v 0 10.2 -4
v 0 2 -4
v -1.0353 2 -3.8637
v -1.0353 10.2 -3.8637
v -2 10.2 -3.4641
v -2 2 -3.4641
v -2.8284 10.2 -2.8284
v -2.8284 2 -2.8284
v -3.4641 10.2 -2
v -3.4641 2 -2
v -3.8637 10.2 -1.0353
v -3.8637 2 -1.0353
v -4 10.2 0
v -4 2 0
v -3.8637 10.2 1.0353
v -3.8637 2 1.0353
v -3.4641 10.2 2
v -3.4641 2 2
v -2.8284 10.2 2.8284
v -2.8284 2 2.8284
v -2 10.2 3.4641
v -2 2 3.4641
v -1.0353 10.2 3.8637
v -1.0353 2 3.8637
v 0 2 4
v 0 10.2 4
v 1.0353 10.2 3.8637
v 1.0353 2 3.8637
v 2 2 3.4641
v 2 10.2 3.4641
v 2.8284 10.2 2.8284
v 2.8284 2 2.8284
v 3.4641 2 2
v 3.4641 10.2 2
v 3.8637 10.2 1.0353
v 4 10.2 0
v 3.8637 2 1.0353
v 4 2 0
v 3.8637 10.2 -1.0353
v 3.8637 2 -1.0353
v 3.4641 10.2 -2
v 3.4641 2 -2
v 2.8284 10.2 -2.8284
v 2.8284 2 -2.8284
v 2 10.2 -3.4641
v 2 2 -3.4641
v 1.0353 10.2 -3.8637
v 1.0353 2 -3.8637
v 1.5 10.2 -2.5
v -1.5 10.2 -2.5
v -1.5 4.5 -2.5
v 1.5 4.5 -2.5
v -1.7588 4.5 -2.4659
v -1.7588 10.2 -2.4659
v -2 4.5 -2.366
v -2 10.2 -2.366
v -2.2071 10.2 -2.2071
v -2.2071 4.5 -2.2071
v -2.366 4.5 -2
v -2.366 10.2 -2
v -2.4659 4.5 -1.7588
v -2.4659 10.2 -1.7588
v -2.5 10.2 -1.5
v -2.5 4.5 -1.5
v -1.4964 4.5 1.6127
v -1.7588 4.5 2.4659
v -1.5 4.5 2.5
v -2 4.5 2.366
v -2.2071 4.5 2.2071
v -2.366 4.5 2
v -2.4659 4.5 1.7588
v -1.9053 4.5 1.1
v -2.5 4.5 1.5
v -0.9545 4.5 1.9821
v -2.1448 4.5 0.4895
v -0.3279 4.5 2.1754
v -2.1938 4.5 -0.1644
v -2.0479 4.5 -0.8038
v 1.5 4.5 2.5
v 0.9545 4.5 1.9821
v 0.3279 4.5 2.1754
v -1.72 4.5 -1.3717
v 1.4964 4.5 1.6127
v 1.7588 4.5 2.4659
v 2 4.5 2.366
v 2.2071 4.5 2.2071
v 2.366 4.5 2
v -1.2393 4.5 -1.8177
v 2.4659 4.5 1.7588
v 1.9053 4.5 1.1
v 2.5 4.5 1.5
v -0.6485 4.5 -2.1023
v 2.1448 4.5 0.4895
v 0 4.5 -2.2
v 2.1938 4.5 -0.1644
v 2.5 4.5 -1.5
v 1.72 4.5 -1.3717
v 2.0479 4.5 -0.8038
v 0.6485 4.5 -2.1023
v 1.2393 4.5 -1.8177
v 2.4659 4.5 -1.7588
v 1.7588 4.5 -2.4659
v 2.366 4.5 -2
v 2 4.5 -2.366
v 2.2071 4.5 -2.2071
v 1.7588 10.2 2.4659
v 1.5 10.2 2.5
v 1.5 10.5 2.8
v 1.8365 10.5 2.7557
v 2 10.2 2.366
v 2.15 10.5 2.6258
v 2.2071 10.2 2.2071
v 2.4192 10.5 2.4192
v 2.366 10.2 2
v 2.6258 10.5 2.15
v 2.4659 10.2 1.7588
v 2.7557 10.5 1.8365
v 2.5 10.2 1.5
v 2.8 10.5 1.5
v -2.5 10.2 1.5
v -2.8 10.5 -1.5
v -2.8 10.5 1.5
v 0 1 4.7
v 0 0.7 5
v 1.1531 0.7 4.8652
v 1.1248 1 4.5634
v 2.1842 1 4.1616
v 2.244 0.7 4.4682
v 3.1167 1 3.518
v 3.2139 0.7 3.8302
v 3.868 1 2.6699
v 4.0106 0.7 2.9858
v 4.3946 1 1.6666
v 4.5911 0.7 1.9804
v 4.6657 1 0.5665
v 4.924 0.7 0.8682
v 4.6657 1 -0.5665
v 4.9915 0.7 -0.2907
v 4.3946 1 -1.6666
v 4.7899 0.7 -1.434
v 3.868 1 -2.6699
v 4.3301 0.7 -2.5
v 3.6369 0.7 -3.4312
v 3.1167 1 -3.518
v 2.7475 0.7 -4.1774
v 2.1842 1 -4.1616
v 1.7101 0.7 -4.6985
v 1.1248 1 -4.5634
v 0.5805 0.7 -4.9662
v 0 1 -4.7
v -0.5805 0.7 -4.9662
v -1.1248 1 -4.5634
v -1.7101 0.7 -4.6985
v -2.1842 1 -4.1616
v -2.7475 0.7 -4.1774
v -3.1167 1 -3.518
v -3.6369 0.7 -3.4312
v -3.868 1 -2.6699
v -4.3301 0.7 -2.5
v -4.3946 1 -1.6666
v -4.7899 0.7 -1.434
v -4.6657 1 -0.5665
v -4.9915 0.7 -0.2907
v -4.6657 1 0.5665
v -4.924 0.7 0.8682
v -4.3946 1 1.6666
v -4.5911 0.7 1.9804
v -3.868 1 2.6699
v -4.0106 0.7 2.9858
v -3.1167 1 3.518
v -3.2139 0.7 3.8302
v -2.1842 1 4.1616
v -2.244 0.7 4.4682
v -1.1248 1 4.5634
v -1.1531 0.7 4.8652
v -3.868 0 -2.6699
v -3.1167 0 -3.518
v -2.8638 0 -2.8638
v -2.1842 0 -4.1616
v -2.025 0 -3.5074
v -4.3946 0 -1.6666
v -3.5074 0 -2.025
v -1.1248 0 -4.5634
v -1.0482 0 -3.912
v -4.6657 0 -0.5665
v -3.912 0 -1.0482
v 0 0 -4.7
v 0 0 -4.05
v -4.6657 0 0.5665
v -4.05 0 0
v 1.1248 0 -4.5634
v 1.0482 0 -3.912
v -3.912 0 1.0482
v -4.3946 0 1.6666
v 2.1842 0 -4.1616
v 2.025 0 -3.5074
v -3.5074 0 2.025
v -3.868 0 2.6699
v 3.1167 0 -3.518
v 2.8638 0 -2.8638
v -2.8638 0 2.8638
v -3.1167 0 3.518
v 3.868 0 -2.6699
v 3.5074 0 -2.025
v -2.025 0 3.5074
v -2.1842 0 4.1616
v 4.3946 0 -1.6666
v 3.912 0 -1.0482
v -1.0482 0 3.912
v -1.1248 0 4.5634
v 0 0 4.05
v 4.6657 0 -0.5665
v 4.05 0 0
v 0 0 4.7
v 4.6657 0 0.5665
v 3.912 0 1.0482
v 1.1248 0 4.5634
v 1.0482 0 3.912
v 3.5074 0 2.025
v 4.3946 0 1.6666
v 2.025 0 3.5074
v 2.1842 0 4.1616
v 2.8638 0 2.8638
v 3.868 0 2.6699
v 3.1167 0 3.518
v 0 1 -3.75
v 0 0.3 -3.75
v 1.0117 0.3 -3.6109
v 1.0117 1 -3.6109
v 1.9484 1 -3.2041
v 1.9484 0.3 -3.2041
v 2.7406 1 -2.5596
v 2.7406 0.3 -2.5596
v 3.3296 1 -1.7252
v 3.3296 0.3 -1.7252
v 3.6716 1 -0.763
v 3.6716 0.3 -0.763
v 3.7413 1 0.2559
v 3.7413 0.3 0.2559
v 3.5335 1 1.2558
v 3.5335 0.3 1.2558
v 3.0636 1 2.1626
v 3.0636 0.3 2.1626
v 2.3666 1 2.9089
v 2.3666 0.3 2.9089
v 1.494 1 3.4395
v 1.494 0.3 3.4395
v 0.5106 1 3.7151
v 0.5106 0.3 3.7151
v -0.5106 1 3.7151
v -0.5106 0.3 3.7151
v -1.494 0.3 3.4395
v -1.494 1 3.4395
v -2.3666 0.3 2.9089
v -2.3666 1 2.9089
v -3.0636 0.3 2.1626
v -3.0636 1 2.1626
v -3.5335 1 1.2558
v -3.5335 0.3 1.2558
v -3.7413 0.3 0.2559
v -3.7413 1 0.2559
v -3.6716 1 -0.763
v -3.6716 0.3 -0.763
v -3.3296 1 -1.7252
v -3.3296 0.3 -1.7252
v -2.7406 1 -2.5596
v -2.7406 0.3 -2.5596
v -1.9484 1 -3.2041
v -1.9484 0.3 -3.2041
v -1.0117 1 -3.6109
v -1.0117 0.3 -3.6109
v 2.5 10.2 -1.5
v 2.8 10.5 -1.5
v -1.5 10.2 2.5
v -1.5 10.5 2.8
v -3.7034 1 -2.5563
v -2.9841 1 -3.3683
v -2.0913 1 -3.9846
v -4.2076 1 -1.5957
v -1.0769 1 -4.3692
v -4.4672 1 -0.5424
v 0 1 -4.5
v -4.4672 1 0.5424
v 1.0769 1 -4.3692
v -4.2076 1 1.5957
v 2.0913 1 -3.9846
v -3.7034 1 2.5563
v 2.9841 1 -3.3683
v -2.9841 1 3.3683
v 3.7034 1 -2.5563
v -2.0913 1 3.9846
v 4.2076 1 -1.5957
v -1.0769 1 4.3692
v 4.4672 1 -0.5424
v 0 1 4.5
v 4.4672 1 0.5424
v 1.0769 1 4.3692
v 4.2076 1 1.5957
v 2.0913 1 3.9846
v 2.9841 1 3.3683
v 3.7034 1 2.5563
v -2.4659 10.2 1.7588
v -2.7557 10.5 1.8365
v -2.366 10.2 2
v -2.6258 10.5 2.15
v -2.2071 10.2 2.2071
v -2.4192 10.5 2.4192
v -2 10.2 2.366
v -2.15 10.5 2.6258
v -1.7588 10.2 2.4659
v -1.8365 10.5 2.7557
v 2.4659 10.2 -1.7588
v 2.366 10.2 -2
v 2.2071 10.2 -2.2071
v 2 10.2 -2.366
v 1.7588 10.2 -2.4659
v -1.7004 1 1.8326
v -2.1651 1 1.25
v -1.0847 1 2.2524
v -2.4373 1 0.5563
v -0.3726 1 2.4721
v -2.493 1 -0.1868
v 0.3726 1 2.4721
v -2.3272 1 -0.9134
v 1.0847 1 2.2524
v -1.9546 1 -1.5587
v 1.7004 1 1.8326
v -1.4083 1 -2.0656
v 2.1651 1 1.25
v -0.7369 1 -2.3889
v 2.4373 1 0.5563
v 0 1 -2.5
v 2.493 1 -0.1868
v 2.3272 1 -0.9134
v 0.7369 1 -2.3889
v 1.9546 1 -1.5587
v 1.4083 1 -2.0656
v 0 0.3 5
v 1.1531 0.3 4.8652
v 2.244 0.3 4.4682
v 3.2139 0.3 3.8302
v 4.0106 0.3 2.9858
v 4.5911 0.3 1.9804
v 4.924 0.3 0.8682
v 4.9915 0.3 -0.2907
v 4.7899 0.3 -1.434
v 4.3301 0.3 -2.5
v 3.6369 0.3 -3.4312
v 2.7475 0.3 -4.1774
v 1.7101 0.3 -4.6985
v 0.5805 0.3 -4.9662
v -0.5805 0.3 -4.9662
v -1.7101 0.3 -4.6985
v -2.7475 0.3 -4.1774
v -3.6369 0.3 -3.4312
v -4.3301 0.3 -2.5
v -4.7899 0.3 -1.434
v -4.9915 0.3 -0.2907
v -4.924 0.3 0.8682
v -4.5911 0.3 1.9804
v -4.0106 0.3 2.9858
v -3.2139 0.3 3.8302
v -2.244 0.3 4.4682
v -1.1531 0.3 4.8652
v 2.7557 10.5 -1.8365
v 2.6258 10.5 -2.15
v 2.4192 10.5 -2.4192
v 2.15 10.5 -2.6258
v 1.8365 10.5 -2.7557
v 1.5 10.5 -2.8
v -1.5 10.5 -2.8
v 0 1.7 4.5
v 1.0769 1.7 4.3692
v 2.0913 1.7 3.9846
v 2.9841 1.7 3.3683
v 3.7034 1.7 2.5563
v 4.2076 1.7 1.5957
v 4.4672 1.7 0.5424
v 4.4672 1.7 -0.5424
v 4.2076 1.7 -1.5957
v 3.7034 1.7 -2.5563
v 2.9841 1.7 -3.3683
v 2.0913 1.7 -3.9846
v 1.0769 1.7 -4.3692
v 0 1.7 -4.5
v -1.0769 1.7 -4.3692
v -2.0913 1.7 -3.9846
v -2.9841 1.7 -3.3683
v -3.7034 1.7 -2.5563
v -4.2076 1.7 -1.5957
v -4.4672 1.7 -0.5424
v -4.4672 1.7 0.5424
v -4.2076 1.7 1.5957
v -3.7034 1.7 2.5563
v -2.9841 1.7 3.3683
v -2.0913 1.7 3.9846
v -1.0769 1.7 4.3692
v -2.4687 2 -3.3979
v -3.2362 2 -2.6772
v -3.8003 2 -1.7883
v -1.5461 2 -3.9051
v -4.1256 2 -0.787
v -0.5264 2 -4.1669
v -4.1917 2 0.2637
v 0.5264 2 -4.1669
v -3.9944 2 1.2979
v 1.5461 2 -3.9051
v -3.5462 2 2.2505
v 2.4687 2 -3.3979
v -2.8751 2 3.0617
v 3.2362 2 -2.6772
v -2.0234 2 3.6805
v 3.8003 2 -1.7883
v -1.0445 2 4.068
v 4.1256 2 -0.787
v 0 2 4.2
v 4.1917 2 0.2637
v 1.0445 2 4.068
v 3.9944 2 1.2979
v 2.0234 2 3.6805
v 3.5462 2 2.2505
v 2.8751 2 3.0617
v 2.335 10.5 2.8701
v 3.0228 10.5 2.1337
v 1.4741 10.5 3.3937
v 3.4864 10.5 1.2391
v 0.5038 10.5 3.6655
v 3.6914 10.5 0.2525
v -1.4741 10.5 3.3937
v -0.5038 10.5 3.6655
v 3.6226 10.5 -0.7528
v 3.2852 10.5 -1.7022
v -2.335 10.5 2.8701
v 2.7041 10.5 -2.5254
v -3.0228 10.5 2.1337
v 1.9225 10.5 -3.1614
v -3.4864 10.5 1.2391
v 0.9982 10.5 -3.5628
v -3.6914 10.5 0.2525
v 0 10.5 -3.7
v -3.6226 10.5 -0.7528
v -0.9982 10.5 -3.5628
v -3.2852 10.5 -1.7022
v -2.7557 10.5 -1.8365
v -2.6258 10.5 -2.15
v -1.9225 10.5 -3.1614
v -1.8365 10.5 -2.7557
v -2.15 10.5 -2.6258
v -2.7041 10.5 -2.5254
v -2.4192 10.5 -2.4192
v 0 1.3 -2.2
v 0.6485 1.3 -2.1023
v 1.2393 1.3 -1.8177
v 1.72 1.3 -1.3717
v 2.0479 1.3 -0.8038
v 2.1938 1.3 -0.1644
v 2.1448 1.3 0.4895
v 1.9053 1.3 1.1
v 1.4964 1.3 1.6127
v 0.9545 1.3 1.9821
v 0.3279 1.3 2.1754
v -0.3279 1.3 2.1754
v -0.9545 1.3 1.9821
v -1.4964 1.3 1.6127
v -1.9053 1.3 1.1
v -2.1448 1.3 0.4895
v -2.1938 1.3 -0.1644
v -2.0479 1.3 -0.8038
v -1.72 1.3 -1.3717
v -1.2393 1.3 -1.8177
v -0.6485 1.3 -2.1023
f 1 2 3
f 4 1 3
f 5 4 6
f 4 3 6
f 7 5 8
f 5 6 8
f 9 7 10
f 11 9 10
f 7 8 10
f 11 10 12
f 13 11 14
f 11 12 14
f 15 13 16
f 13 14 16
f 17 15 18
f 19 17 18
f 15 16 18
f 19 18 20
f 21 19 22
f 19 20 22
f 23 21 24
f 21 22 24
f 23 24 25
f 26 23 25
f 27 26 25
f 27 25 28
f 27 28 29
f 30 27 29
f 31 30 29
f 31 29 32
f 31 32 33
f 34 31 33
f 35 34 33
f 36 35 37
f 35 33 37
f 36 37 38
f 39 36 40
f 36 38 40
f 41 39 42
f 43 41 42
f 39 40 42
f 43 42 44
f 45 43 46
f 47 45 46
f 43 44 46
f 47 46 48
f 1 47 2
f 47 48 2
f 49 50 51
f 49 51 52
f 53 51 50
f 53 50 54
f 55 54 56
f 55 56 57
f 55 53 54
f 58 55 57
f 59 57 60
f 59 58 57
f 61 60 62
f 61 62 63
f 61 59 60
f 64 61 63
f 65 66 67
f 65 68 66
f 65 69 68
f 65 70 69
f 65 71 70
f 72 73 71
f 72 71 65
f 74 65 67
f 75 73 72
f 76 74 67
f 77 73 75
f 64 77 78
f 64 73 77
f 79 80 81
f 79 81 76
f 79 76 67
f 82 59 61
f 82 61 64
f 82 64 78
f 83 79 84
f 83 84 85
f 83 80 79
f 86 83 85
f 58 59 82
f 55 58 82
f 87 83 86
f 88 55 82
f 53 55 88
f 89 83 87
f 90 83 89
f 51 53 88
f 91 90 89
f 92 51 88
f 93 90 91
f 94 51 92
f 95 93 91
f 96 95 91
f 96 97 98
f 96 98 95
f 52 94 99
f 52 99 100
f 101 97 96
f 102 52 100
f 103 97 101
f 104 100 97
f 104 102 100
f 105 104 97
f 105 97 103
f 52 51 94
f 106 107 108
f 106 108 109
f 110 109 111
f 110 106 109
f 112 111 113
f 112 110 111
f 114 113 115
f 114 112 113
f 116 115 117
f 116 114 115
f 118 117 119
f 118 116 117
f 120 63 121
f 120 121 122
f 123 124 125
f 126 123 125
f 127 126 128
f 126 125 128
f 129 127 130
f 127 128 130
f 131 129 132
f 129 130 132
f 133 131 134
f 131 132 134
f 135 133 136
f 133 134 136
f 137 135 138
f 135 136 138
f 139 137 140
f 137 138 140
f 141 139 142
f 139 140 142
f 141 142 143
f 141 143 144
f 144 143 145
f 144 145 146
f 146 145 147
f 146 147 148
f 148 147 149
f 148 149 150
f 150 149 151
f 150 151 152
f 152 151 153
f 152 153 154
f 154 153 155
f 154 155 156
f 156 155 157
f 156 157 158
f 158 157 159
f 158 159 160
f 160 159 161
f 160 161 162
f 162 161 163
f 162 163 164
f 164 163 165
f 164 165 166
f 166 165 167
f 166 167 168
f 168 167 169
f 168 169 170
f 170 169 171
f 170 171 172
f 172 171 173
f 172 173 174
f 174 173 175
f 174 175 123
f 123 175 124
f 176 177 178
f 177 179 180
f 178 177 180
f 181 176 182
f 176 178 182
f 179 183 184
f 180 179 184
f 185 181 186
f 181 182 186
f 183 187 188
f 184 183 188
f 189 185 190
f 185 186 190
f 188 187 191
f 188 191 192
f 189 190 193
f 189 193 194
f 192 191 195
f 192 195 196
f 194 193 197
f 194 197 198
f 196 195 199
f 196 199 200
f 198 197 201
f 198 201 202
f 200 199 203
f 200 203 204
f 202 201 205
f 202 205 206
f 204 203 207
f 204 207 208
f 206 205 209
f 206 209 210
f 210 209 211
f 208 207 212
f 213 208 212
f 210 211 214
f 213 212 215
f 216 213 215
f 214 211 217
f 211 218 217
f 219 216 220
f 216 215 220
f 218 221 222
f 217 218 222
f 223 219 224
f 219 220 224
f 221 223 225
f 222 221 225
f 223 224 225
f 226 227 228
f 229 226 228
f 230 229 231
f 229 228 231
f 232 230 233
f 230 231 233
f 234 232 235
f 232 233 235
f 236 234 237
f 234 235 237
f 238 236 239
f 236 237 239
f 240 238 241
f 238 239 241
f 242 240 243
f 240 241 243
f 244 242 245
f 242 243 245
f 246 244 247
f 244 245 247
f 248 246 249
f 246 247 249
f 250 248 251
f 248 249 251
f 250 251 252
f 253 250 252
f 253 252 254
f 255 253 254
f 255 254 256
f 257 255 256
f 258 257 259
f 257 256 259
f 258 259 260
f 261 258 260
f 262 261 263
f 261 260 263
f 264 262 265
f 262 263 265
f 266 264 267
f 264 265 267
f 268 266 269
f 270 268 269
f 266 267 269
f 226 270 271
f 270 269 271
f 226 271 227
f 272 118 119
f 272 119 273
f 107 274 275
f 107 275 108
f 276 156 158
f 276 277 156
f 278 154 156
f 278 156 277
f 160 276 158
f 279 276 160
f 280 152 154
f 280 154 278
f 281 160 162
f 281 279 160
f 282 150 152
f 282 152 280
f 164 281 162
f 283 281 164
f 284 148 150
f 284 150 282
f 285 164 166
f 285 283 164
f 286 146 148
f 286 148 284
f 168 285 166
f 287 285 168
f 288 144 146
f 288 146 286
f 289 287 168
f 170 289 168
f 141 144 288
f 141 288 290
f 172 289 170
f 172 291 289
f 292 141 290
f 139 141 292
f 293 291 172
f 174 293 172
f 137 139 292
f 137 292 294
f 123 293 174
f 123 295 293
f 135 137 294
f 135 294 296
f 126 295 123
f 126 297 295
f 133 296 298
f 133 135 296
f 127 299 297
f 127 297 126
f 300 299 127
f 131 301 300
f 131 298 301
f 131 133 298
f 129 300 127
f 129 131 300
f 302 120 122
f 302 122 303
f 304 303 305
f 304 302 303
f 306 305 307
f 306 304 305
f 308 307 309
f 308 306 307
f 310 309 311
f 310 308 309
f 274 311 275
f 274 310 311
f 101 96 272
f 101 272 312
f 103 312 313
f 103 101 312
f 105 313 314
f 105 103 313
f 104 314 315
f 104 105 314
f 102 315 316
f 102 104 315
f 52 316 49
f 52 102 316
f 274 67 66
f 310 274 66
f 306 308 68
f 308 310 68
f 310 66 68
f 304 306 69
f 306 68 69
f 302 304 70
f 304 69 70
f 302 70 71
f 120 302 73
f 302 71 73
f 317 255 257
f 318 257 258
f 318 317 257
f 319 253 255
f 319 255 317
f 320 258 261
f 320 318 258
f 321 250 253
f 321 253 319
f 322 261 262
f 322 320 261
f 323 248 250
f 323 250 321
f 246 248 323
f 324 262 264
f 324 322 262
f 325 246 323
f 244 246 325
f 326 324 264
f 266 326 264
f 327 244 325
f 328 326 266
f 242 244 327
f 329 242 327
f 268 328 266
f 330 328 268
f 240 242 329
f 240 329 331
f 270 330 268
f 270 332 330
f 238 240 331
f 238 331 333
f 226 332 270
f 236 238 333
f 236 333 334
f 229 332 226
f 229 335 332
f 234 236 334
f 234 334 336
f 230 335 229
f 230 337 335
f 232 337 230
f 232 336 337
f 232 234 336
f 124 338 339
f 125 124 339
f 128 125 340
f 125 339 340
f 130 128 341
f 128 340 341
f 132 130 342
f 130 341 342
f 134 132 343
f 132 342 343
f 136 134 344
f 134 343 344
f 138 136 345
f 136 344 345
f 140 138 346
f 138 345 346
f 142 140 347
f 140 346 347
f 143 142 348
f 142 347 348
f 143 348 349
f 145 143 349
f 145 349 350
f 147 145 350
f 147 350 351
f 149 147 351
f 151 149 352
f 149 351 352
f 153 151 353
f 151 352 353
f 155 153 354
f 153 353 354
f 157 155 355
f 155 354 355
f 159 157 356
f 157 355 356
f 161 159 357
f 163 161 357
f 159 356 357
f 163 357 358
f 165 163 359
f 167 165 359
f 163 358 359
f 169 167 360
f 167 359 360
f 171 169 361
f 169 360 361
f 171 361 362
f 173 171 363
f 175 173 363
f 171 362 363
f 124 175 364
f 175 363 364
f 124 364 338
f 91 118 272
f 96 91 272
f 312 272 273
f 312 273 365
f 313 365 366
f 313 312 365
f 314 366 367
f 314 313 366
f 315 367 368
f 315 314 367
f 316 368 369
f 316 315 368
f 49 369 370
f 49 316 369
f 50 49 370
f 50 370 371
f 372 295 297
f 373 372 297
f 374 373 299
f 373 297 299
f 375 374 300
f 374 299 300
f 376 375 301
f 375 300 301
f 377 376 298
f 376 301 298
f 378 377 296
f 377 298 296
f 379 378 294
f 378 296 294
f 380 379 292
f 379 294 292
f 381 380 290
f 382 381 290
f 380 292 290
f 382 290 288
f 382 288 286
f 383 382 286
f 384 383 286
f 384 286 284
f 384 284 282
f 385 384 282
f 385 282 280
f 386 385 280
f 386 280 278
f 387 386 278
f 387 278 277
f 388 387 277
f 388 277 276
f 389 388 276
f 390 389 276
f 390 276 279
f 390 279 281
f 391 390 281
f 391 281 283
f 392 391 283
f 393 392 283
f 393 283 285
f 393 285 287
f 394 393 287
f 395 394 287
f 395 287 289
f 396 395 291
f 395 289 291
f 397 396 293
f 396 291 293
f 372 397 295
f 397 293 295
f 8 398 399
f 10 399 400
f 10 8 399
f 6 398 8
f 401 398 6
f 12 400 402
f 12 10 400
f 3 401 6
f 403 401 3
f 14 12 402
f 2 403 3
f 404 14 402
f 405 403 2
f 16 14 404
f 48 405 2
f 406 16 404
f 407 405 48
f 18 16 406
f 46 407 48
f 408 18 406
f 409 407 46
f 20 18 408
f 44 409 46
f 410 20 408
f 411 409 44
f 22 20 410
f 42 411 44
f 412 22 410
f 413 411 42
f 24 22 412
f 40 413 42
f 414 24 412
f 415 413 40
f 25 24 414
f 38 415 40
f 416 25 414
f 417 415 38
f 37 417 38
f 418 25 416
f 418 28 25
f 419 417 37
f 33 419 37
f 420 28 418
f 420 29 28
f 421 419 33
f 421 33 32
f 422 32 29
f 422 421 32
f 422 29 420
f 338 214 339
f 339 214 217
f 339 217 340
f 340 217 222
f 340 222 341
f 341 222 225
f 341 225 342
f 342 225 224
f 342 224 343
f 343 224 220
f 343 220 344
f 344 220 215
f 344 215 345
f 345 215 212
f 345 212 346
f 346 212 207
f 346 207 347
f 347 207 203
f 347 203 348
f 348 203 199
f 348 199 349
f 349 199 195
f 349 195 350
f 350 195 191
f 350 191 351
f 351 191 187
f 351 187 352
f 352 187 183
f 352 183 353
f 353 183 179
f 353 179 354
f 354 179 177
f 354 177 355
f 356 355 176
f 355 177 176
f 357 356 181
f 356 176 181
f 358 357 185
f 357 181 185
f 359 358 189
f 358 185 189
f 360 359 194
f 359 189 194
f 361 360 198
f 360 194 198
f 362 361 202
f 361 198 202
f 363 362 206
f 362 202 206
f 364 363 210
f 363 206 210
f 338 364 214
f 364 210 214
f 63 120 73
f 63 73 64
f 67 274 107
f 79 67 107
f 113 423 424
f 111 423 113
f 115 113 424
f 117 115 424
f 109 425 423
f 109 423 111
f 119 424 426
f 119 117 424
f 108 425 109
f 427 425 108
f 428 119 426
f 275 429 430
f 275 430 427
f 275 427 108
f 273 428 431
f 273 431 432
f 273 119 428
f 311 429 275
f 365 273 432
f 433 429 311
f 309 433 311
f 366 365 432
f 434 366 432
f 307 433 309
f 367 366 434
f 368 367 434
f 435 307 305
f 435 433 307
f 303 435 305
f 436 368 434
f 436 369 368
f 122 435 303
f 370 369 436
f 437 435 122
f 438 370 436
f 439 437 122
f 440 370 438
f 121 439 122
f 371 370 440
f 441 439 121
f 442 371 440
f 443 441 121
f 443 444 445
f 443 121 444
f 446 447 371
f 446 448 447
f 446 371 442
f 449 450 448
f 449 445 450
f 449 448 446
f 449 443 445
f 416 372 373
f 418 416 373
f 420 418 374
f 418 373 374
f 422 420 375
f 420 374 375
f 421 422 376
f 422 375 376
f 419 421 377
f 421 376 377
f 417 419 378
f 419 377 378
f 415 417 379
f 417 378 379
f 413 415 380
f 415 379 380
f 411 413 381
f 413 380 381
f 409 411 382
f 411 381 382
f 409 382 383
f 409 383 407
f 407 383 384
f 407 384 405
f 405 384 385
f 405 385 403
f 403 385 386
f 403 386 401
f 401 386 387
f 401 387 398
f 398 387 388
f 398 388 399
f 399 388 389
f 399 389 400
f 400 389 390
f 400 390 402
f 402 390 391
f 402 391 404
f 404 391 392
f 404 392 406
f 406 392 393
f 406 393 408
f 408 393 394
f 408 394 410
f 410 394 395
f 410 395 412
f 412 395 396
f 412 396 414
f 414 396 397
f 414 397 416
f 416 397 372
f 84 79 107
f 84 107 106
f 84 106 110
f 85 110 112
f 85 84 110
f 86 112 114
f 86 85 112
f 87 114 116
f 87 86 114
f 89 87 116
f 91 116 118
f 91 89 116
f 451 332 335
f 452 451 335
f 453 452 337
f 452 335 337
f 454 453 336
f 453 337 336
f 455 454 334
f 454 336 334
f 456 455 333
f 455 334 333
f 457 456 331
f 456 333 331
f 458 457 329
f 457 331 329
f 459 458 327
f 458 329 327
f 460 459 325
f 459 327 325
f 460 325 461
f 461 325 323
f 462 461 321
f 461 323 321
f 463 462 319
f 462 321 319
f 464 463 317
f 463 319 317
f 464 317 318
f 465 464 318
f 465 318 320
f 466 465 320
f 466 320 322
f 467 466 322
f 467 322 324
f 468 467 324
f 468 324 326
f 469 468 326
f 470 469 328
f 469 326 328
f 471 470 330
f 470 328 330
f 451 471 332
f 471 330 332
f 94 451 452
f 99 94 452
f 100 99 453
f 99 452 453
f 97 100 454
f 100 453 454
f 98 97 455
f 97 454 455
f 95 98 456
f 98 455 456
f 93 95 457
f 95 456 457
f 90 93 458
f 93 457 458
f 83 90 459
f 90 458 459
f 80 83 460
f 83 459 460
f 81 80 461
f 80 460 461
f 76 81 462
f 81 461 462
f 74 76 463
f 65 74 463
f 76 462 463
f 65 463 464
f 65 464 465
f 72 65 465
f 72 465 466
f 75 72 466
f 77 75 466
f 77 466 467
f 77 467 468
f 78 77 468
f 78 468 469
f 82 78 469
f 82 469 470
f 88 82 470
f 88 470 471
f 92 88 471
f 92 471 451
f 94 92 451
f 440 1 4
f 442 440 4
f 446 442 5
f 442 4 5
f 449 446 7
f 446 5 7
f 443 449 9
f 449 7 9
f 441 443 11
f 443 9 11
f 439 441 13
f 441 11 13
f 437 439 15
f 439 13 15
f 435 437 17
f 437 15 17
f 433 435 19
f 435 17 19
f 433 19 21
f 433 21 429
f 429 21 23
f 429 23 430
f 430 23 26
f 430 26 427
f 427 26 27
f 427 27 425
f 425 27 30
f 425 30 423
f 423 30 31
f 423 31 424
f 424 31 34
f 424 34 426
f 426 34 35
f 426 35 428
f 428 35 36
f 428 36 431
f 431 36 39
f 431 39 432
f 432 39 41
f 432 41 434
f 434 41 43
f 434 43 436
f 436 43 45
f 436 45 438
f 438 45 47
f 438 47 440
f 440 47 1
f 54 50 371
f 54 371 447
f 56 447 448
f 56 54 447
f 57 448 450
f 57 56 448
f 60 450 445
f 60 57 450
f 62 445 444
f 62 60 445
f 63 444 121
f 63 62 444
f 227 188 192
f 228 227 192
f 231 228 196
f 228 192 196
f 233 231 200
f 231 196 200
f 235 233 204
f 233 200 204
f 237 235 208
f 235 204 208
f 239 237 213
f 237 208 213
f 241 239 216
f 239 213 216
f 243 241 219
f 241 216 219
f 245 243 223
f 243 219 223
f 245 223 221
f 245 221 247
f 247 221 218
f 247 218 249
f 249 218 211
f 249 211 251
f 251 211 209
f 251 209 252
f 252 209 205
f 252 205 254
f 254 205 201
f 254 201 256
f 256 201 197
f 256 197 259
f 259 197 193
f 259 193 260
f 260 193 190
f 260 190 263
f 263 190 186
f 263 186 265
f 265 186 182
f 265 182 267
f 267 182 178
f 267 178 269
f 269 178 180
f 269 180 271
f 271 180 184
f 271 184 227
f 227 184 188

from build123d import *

# Parameters (mm, degrees)
SKETCH_1_R          = 5
SKETCH_1_R_2        = 4.5
EXTRUDE_1_DEPTH     = 1
SKETCH_1_5_R        = 4.5
SKETCH_1_5_R_2      = 4
EXTRUDE_2_DEPTH     = 2
SKETCH_1_6_R        = 4
SKETCH_1_6_W        = 5
SKETCH_1_6_H        = 5
EXTRUDE_3_DEPTH     = 10.5
CUT_EXTRUDE_START   = 10.5
SKETCH_1_7_W        = 5
SKETCH_1_7_H        = 5
CUT_EXTRUDE_1_DEPTH = 6
SKETCH_2_R          = 2.2
CUT_EXTRUDE_2_DEPTH = 20
SKETCH_3_R          = 3.75
CUT_EXTRUDE_4_DEPTH = 1
FILLET_1_R          = 1
CHAMFER_1_SIZE      = 0.3


with BuildPart() as part:
    # 스케치1 → 보스-돌출1 (new body)
    with BuildSketch(Plane(origin=(0, 0, 0), x_dir=(1, 0, 0), z_dir=(0, 1, 0))):
        with Locations(Location((0, 0, 0), (0, 0, 270))):
            Circle(SKETCH_1_R)
        with Locations(Location((0, 0, 0), (0, 0, 270))):
            Circle(SKETCH_1_R_2, mode=Mode.SUBTRACT)
    extrude(amount=EXTRUDE_1_DEPTH)

    # 스케치1<5> → 보스-돌출2 (add)
    with BuildSketch(Plane(origin=(0, 0, 0), x_dir=(1, 0, 0), z_dir=(0, 1, 0))):
        with Locations(Location((0, 0, 0), (0, 0, 270))):
            Circle(SKETCH_1_5_R)
        with Locations(Location((0, 0, 0), (0, 0, 270))):
            Circle(SKETCH_1_5_R_2, mode=Mode.SUBTRACT)
    extrude(amount=EXTRUDE_2_DEPTH)

    # 스케치1<6> → 보스-돌출3 (add)
    # profile 1 of 2: a face of its own
    with BuildSketch(Plane(origin=(0, 0, 0), x_dir=(1, 0, 0), z_dir=(0, 1, 0))):
        with Locations(Location((0, 0, 0), (0, 0, 90))):
            Circle(SKETCH_1_6_R)
        Rectangle(SKETCH_1_6_W, SKETCH_1_6_H, mode=Mode.SUBTRACT)
    # profile 2 of 2: a face of its own
    with BuildSketch(Plane(origin=(0, 0, 0), x_dir=(1, 0, 0), z_dir=(0, 1, 0))):
        Rectangle(SKETCH_1_6_W, SKETCH_1_6_H)
    extrude(amount=EXTRUDE_3_DEPTH)

    # 스케치1<7> → 컷-돌출1 (cut)
    with BuildSketch(Plane(origin=(0, 0, 0), x_dir=(1, 0, 0), z_dir=(0, 1, 0)).offset(CUT_EXTRUDE_START)):
        Rectangle(SKETCH_1_7_W, SKETCH_1_7_H)
    extrude(amount=-CUT_EXTRUDE_1_DEPTH, mode=Mode.SUBTRACT)

    # 스케치2 → 컷-돌출2 (cut)
    with BuildSketch(Plane.XZ):
        with Locations(Location((0, 0, 0), (0, 0, 270))):
            Circle(SKETCH_2_R)
    extrude(amount=-CUT_EXTRUDE_2_DEPTH, mode=Mode.SUBTRACT)

    # 스케치3 → 컷-돌출4 (cut)
    with BuildSketch(Plane.XZ):
        with Locations(Location((0, 0, 0), (0, 0, 270))):
            Circle(SKETCH_3_R)
    extrude(amount=-CUT_EXTRUDE_4_DEPTH, mode=Mode.SUBTRACT)

    # 필렛1
    fillet_1_edges = [part.edges().sort_by_distance(p)[0] for p in [
        (-2.5, 7.5, 2.5),
        (-2.5, 7.5, -2.5),
        (2.5, 7.5, -2.5),
        (2.5, 7.5, 2.5),
    ]]
    fillet(fillet_1_edges, radius=FILLET_1_R)

    # 모따기1
    chamfer_1_edges = [part.edges().sort_by_distance(p)[0] for p in [
        (0, 2, -4.5),
        (0, 1, -5),
        (0, 10.5, 4),
        (0, 0, -5),
        (0, 0, 3.75),
        (0, 1, 2.2),
        (2.5, 10.5, 0),
        (0, 10.5, 2.5),
        (-2.5, 10.5, 0),
        (0, 10.5, -2.5),
        (2.207106781, 10.5, 2.207106781),
        (-2.207106781, 10.5, 2.207106781),
        (2.207106781, 10.5, -2.207106781),
        (-2.207106781, 10.5, -2.207106781),
    ]]
    chamfer(chamfer_1_edges, length=CHAMFER_1_SIZE)


solid = part.part
